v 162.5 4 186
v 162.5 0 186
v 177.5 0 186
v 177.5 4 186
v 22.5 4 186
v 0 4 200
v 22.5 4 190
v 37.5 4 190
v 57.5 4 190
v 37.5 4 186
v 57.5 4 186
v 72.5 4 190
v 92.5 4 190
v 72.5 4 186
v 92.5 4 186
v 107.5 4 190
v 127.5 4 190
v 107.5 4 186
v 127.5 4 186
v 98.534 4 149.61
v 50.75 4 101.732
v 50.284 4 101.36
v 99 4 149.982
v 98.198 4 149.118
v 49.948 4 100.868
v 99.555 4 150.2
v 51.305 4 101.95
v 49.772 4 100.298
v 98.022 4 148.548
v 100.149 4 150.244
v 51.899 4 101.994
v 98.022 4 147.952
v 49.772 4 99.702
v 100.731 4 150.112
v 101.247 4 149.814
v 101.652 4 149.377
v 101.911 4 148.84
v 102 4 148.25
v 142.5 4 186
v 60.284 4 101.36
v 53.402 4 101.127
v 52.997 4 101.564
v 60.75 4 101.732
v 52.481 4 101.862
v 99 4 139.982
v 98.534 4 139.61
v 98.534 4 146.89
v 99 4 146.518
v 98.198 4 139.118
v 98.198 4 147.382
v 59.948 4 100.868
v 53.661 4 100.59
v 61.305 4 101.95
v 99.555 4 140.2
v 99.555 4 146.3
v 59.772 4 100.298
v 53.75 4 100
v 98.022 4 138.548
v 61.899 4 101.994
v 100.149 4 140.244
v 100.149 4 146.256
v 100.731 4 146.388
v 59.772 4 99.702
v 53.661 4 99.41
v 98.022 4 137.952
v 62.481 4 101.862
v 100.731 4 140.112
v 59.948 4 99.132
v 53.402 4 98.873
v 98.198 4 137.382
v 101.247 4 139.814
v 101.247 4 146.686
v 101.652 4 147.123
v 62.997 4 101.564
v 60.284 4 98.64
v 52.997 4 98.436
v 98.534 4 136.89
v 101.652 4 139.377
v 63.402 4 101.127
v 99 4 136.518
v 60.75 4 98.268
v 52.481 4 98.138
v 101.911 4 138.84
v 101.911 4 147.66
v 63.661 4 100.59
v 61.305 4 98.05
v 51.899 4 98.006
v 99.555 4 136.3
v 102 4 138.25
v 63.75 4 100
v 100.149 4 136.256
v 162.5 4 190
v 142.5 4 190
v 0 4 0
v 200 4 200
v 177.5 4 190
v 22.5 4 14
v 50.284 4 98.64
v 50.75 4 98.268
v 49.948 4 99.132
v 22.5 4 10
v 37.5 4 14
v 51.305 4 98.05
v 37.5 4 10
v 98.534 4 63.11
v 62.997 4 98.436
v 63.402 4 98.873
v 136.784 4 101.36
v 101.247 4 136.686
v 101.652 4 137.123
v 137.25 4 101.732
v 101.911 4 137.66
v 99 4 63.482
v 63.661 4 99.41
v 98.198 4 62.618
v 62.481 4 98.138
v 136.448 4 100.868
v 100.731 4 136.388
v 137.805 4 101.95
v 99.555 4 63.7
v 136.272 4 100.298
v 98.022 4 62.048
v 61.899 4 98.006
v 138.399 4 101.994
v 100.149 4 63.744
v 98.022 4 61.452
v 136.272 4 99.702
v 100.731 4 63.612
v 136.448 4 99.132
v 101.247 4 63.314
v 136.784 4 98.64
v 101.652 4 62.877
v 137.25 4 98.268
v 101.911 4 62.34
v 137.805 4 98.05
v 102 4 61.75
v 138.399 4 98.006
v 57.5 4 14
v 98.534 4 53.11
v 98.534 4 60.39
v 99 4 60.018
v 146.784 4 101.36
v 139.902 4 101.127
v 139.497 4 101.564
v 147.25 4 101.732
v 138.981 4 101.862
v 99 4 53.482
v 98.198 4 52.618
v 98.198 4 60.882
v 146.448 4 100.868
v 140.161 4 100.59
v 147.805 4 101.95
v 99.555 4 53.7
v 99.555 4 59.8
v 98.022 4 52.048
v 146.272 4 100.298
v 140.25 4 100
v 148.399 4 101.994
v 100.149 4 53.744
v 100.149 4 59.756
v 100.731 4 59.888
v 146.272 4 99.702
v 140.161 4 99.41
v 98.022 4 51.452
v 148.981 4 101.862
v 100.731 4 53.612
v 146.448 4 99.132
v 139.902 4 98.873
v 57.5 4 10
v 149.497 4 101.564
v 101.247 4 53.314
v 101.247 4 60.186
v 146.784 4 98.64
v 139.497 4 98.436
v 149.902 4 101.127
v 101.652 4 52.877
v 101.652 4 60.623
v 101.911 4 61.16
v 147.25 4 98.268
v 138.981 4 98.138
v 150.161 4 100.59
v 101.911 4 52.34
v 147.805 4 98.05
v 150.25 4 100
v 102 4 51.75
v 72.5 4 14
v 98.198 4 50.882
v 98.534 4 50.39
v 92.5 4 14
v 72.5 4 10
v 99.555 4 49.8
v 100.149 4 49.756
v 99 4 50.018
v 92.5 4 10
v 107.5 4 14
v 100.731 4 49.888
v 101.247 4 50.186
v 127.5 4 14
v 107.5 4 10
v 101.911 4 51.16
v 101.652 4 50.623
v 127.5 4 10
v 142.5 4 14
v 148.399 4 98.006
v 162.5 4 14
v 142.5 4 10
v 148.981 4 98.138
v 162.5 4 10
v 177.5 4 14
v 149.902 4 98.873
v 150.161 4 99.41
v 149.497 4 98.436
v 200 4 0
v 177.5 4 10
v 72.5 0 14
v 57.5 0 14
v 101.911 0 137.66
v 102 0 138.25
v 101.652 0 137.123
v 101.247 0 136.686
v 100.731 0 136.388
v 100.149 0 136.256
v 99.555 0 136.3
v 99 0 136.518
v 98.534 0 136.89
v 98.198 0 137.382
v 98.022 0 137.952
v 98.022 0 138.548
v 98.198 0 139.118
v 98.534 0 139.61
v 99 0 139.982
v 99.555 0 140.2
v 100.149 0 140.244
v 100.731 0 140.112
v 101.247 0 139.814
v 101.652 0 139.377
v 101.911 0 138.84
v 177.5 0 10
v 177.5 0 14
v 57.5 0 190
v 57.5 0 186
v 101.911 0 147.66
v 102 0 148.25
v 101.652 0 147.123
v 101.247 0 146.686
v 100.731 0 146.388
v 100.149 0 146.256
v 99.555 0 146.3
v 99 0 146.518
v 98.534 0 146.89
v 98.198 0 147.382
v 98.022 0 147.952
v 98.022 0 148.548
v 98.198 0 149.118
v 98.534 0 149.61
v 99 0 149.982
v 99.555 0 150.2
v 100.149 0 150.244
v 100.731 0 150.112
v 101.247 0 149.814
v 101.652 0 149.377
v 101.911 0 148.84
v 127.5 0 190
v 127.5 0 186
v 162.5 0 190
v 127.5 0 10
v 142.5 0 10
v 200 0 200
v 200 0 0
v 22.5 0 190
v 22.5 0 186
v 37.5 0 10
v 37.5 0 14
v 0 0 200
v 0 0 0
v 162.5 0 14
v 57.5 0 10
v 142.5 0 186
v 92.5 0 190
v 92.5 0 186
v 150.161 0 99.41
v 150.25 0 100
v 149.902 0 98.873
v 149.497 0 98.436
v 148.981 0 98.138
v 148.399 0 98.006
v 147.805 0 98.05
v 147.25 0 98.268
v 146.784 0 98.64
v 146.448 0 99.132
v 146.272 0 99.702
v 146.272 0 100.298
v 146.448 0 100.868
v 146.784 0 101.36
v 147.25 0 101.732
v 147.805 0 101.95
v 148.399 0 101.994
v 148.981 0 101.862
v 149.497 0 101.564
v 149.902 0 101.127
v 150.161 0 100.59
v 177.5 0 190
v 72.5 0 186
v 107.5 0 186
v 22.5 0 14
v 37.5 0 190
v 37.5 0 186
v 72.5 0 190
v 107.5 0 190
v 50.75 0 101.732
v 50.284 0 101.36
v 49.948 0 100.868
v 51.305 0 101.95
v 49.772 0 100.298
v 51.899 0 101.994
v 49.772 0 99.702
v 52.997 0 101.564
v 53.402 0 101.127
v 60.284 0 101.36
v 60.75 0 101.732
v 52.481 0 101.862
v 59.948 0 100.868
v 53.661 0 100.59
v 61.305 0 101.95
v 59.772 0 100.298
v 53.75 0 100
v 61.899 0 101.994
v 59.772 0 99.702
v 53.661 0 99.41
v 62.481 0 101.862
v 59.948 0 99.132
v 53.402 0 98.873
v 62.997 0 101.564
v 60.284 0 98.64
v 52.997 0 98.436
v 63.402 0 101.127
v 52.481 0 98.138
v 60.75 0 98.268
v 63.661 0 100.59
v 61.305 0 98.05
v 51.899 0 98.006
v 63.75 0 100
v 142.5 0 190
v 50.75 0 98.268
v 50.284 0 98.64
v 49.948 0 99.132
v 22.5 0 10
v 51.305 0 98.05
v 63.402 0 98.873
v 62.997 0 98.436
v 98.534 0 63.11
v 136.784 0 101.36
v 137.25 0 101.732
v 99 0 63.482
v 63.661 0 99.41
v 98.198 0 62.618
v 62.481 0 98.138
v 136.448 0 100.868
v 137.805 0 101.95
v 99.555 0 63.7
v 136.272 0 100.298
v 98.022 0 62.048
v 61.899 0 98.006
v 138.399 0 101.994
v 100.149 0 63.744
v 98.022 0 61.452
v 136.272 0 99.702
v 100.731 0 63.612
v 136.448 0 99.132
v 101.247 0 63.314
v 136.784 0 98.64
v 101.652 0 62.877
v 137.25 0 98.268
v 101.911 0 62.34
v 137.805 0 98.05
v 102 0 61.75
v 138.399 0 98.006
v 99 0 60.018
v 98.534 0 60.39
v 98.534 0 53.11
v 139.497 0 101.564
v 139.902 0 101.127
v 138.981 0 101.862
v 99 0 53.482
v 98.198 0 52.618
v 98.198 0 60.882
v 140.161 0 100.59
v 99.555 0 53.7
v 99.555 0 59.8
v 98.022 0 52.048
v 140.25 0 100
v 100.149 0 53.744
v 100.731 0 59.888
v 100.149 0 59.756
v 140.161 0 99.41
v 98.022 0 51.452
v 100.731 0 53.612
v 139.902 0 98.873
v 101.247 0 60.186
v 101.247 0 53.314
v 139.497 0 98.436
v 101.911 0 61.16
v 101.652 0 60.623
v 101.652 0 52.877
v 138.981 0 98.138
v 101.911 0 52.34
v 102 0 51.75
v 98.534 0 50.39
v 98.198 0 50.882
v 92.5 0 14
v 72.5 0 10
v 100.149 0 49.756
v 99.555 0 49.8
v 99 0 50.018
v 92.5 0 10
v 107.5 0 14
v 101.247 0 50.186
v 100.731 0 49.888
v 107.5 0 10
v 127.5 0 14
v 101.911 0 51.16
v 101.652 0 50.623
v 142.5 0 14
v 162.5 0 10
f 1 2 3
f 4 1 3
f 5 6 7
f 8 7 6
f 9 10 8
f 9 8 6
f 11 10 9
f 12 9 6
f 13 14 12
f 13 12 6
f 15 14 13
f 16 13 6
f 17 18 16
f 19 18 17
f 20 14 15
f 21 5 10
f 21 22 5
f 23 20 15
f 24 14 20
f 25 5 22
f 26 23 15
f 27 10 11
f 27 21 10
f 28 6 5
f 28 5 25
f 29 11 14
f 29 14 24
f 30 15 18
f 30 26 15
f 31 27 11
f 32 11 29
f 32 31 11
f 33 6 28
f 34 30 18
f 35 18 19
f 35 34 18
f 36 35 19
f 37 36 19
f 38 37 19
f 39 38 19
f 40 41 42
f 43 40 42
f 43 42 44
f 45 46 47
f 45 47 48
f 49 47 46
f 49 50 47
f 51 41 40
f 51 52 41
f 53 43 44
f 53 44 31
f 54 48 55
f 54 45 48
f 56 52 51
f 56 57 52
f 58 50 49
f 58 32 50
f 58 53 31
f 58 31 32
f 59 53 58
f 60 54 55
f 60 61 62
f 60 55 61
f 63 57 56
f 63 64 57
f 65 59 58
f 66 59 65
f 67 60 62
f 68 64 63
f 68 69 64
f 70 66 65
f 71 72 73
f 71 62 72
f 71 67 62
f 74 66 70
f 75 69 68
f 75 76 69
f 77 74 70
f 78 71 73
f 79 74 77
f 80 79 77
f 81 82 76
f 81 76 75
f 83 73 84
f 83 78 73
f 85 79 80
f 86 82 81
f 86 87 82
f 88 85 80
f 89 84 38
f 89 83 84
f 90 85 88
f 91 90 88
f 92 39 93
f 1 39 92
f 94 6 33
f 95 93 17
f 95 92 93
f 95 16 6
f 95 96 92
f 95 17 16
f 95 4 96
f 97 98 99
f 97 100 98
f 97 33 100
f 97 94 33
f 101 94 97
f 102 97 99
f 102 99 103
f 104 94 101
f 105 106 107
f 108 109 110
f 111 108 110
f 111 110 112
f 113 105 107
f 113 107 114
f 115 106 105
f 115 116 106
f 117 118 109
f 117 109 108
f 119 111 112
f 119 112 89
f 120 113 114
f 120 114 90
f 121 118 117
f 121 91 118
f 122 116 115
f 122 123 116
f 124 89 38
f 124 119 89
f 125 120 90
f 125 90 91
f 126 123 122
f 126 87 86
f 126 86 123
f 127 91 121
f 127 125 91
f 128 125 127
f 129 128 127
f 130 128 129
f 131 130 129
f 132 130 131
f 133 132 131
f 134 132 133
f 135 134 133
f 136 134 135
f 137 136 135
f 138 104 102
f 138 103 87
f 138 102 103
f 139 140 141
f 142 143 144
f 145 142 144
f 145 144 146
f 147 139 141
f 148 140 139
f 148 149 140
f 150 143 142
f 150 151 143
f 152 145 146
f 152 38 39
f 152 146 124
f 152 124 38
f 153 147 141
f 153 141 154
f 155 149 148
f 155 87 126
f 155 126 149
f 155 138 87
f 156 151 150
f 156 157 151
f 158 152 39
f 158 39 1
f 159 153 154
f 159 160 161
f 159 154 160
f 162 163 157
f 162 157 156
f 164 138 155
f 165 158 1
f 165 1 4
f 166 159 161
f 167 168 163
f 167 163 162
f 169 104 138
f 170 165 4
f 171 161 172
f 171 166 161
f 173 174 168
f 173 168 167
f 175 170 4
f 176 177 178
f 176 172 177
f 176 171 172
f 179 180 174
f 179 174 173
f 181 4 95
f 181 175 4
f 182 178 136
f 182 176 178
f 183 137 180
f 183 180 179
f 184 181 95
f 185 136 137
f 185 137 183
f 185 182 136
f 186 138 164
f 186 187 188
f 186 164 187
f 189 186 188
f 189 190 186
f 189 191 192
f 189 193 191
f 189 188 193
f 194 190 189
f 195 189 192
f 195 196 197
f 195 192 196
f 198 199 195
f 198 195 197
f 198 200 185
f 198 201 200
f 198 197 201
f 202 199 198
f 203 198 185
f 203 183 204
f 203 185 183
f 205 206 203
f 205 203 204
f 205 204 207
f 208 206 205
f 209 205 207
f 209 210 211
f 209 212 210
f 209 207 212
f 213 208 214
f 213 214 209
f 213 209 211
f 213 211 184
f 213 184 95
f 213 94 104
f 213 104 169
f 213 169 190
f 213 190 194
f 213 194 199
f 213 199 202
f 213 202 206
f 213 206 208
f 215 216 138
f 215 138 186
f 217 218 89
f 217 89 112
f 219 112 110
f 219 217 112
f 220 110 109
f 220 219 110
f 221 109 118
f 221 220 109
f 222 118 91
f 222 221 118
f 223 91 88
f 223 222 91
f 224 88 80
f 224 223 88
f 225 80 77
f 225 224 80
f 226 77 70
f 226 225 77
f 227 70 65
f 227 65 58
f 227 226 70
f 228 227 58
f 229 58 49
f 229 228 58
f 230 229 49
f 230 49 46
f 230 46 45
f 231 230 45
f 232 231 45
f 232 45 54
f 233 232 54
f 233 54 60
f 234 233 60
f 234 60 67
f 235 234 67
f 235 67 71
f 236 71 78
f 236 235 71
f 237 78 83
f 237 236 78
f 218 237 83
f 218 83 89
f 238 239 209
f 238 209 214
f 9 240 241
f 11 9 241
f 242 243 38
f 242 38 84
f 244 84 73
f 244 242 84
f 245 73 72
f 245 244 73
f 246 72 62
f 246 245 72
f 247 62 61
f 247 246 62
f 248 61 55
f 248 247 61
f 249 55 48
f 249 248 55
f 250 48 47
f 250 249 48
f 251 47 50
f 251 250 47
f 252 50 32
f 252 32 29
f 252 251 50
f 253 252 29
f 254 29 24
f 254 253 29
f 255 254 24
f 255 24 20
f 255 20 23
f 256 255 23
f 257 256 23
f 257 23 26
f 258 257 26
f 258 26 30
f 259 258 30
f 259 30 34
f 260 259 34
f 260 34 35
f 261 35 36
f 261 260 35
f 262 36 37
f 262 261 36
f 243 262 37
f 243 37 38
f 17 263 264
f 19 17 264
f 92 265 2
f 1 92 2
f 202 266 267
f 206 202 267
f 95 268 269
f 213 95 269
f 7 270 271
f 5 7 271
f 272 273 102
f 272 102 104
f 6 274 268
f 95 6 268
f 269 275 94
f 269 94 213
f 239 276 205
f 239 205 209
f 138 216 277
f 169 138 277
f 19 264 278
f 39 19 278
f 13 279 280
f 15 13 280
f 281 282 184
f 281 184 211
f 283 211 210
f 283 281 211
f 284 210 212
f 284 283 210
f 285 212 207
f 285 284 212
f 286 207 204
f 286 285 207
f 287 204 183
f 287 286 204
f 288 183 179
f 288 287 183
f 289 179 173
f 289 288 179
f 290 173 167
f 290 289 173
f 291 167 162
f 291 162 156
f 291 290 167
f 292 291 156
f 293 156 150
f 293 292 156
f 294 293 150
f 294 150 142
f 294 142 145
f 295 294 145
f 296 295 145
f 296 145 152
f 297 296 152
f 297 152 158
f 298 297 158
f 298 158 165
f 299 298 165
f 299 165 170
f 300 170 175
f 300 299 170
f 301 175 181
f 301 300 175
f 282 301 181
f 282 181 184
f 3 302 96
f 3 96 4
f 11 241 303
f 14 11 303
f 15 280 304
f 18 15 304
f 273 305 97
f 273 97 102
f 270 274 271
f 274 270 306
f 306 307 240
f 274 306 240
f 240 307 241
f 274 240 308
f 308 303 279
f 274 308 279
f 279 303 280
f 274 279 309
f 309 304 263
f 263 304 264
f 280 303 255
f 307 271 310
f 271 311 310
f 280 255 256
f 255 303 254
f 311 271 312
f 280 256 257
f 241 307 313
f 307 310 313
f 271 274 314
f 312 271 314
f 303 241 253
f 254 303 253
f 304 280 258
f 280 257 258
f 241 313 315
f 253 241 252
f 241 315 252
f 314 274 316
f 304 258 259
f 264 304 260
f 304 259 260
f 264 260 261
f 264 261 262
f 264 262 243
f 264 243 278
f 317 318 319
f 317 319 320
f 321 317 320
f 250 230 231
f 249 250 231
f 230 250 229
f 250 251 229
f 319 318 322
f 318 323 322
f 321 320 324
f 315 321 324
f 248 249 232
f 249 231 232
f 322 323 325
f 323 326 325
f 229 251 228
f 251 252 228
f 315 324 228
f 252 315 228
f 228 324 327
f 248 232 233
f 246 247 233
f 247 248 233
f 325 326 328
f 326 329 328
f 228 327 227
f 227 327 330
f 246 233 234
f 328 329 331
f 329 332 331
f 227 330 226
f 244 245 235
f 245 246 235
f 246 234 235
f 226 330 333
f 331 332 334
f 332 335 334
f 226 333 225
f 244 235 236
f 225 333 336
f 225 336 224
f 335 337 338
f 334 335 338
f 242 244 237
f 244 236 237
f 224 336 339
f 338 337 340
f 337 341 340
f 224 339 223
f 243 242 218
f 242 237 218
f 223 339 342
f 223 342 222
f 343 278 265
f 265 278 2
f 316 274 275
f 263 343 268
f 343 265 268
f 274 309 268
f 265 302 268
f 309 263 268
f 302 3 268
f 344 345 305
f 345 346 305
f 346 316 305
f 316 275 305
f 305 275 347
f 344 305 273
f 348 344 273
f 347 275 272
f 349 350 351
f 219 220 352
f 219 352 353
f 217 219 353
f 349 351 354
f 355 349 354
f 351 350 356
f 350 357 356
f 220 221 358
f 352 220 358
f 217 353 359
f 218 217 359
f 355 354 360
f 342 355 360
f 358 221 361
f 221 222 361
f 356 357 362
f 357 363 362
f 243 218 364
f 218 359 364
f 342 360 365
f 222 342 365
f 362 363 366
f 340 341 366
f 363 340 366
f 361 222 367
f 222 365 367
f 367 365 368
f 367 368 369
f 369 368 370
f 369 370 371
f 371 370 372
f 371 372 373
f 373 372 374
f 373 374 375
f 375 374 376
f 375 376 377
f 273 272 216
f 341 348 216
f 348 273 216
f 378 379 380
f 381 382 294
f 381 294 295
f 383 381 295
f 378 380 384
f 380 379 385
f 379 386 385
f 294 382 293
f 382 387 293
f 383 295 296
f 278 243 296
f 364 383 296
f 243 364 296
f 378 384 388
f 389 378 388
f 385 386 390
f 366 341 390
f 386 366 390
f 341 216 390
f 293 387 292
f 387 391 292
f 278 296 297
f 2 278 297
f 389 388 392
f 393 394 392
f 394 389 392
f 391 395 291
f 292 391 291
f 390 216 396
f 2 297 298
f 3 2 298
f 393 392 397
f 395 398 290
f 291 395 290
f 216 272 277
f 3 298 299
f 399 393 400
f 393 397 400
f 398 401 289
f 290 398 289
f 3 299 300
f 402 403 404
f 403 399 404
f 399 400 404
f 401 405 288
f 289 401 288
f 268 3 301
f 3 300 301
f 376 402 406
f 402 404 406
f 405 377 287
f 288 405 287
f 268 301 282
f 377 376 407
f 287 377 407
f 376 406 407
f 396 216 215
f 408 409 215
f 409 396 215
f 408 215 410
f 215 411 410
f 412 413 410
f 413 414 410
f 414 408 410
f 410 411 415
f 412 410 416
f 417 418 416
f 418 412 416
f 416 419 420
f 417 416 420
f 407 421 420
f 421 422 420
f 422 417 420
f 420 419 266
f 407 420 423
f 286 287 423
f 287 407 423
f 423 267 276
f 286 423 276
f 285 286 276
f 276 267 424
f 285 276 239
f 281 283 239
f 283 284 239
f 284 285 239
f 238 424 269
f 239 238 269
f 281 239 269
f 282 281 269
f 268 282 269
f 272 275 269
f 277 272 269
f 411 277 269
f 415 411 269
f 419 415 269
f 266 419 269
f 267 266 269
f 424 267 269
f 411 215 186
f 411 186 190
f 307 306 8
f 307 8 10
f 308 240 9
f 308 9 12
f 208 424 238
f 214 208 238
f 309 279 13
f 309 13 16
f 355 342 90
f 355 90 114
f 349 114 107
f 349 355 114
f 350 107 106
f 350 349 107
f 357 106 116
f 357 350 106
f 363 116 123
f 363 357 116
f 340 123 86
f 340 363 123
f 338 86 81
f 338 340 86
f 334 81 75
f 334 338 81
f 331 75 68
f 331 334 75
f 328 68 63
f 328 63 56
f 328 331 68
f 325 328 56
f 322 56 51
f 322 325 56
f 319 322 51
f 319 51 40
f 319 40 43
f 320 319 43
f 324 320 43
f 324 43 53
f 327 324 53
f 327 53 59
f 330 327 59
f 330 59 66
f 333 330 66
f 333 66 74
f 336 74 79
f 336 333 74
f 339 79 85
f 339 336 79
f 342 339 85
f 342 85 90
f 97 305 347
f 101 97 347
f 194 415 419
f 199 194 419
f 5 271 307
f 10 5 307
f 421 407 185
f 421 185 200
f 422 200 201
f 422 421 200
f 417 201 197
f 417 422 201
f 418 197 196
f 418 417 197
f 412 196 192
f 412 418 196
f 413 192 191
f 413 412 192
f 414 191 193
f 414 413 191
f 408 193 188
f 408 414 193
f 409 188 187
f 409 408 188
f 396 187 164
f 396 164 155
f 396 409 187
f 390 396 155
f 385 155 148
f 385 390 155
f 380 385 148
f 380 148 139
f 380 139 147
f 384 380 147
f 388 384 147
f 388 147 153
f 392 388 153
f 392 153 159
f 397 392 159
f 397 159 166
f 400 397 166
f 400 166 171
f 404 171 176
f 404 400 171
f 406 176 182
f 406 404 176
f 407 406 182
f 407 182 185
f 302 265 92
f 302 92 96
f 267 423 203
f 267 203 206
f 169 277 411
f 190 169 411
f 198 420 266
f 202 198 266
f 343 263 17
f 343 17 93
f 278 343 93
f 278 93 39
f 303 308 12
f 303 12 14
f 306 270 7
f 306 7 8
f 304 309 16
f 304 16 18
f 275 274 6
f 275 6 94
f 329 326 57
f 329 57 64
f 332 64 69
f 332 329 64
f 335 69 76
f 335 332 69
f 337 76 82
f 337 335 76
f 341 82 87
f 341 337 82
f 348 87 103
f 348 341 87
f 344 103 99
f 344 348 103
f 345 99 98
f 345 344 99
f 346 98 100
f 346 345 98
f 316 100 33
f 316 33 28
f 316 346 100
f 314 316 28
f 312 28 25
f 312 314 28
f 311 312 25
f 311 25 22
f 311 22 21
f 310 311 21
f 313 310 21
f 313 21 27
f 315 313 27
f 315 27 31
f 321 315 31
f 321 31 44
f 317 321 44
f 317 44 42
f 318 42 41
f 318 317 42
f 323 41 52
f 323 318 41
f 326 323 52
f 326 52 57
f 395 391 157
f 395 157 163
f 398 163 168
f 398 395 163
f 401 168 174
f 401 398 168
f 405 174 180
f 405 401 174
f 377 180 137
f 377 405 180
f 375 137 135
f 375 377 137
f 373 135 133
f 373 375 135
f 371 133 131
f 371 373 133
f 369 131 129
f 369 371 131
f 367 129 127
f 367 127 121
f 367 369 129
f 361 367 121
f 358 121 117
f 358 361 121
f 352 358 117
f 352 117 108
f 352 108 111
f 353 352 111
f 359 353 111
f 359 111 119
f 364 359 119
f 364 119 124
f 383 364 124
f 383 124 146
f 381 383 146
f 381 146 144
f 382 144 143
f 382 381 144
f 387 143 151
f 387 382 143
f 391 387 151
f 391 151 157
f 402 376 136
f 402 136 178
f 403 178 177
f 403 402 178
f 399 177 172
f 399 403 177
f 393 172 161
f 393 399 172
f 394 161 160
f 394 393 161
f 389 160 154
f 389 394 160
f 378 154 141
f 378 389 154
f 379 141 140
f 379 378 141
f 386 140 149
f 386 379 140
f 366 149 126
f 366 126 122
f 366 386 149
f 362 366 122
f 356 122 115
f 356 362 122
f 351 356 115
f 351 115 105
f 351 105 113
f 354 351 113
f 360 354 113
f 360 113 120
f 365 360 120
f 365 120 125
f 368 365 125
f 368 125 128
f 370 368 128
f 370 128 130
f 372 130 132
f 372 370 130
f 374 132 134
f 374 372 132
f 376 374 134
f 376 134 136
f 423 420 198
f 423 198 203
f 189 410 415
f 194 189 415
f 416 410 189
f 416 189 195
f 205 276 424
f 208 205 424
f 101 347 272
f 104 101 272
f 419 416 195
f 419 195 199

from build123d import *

# Parameters (mm, degrees)
SKETCH1_W           = 200
SKETCH1_H           = 200
SKETCH1_R           = 2
SKETCH1_W_2         = 15
SKETCH1_H_2         = 4
BOSS_EXTRUDE1_DEPTH = 4


with BuildPart() as part:
    # Sketch1 → Boss-Extrude1 (new body)
    with BuildSketch(Plane(origin=(0, 0, 0), x_dir=(1, 0, 0), z_dir=(0, 1, 0))):
        with Locations((100, -100)):
            Rectangle(SKETCH1_W, SKETCH1_H)
        with Locations((100, -61.75)):
            Circle(SKETCH1_R, mode=Mode.SUBTRACT)
        with Locations((100, -51.75)):
            Circle(SKETCH1_R, mode=Mode.SUBTRACT)
        with Locations((100, -148.25)):
            Circle(SKETCH1_R, mode=Mode.SUBTRACT)
        with Locations((100, -138.25)):
            Circle(SKETCH1_R, mode=Mode.SUBTRACT)
        with Locations((61.75, -100)):
            Circle(SKETCH1_R, mode=Mode.SUBTRACT)
        with Locations((51.75, -100)):
            Circle(SKETCH1_R, mode=Mode.SUBTRACT)
        with Locations((138.25, -100)):
            Circle(SKETCH1_R, mode=Mode.SUBTRACT)
        with Locations((148.25, -100)):
            Circle(SKETCH1_R, mode=Mode.SUBTRACT)
        with Locations((30, -12)):
            Rectangle(SKETCH1_W_2, SKETCH1_H_2, mode=Mode.SUBTRACT)
        with Locations((65, -12)):
            Rectangle(SKETCH1_W_2, SKETCH1_H_2, mode=Mode.SUBTRACT)
        with Locations((100, -12)):
            Rectangle(SKETCH1_W_2, SKETCH1_H_2, mode=Mode.SUBTRACT)
        with Locations((135, -12)):
            Rectangle(SKETCH1_W_2, SKETCH1_H_2, mode=Mode.SUBTRACT)
        with Locations((170, -12)):
            Rectangle(SKETCH1_W_2, SKETCH1_H_2, mode=Mode.SUBTRACT)
        with Locations((170, -188)):
            Rectangle(SKETCH1_W_2, SKETCH1_H_2, mode=Mode.SUBTRACT)
        with Locations((135, -188)):
            Rectangle(SKETCH1_W_2, SKETCH1_H_2, mode=Mode.SUBTRACT)
        with Locations((100, -188)):
            Rectangle(SKETCH1_W_2, SKETCH1_H_2, mode=Mode.SUBTRACT)
        with Locations((65, -188)):
            Rectangle(SKETCH1_W_2, SKETCH1_H_2, mode=Mode.SUBTRACT)
        with Locations((30, -188)):
            Rectangle(SKETCH1_W_2, SKETCH1_H_2, mode=Mode.SUBTRACT)
    extrude(amount=BOSS_EXTRUDE1_DEPTH)


solid = part.part
